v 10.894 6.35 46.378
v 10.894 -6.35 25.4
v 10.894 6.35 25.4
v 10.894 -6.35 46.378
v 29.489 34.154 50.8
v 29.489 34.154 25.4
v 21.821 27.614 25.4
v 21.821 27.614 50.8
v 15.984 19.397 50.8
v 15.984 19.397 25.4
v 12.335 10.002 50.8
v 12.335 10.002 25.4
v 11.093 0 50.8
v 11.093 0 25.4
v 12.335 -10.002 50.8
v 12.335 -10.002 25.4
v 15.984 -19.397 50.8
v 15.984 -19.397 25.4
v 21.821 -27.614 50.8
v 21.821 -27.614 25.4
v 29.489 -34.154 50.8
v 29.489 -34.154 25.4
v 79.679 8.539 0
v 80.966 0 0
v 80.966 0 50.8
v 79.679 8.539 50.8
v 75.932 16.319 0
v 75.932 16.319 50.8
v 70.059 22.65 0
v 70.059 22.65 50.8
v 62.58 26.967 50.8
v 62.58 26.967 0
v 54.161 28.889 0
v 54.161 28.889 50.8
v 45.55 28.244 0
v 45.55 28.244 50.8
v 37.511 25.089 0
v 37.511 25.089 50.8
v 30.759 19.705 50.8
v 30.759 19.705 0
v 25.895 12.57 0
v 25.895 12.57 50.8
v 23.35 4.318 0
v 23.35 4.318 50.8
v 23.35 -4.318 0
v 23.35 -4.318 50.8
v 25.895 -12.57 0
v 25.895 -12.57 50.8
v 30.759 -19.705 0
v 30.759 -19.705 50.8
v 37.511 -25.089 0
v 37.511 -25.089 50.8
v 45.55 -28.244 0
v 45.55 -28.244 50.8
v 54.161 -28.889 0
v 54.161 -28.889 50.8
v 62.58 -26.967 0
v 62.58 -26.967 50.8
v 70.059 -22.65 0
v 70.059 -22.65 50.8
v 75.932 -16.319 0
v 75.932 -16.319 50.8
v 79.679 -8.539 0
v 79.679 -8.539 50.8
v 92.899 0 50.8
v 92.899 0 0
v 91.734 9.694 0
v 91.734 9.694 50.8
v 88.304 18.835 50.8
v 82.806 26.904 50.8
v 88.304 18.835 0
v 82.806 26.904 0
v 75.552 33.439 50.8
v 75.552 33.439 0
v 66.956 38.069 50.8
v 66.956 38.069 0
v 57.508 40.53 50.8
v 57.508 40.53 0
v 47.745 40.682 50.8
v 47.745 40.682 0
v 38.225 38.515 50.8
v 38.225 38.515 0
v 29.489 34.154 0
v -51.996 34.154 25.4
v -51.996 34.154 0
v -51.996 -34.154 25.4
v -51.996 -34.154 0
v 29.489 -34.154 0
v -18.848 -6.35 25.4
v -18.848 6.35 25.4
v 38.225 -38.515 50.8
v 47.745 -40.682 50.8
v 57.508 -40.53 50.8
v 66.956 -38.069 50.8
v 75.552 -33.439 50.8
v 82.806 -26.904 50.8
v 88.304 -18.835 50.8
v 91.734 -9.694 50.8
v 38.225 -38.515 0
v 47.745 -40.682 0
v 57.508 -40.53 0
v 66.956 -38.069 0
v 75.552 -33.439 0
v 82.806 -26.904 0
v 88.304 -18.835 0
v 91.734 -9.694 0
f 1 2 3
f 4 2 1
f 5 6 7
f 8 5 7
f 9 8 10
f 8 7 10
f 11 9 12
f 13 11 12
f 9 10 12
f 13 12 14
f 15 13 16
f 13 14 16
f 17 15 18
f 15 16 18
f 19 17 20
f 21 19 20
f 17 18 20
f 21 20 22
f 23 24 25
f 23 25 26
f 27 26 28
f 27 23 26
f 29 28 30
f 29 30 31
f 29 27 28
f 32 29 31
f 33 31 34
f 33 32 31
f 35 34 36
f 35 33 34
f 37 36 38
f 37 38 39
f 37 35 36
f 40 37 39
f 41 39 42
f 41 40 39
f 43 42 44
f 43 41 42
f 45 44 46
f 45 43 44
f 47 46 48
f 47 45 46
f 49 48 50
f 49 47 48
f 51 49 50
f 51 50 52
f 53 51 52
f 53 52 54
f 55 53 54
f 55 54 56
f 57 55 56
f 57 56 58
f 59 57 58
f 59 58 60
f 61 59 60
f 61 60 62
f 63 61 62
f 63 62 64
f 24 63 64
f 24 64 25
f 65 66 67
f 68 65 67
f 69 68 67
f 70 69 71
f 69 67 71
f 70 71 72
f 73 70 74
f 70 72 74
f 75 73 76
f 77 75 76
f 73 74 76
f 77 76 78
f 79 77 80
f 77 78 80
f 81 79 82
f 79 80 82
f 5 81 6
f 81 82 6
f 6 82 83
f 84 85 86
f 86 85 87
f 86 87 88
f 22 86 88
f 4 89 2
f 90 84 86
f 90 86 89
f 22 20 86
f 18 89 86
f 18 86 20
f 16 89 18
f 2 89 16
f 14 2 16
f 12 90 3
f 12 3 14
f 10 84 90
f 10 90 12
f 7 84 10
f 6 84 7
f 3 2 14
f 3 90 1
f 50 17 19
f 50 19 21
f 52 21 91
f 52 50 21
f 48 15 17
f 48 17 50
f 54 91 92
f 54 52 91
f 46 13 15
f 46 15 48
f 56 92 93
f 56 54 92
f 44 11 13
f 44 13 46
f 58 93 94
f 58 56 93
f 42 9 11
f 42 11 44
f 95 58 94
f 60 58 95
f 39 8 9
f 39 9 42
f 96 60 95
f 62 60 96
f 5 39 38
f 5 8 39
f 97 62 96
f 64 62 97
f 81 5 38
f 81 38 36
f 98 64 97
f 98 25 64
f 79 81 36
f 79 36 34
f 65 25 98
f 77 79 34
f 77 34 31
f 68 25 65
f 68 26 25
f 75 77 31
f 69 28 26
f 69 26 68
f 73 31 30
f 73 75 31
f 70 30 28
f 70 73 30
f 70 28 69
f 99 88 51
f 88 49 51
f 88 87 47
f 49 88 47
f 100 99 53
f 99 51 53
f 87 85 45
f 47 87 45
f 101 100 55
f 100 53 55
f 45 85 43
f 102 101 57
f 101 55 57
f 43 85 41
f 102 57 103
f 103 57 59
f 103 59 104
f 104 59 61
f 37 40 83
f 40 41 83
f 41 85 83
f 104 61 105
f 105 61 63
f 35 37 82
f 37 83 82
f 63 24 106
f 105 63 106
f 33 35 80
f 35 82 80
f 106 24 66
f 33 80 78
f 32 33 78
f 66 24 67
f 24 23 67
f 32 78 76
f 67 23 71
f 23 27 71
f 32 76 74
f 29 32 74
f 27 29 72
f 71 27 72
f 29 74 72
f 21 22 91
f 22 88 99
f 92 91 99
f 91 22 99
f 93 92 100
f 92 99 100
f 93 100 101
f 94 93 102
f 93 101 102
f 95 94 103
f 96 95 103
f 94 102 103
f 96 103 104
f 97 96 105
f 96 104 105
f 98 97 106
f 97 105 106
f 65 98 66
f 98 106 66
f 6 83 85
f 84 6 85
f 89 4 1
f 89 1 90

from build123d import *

# Parameters (mm, degrees)
F0_R     = 28.970038
F1_DEPTH = 50.8
F2_DEPTH = 25.4
F4_DEPTH = 6.35


with BuildPart() as f1:
    # F0 (on Top) → F1 (new body)
    with BuildSketch(Plane.XY):
        with BuildLine():
            ThreePointArc((92.899099, 0), (71.392782, 36.011503), (29.489314, 34.154247))
            ThreePointArc((29.489314, 34.154247), (11.092901, 0), (29.489314, -34.154247))
            ThreePointArc((29.489314, -34.154247), (71.392782, -36.011503), (92.899099, 0))
        make_face()
        with Locations((51.996, 0)):
            Circle(F0_R, mode=Mode.SUBTRACT)
    extrude(amount=F1_DEPTH)

    # F0 (on Top) → F2 (join)
    with BuildSketch(Plane.XY):
        with BuildLine():
            ThreePointArc((29.489314, -34.154247), (11.092901, 0), (29.489314, 34.154247))
            Line((29.489314, 34.154247), (-51.996, 34.154247))
            Line((-51.996, 34.154247), (-51.996, -34.154247))
            Line((-51.996, -34.154247), (29.489314, -34.154247))
        make_face()
        with BuildLine():
            ThreePointArc((92.899099, 0), (71.392782, 36.011503), (29.489314, 34.154247))
            ThreePointArc((29.489314, 34.154247), (11.092901, 0), (29.489314, -34.154247))
            ThreePointArc((29.489314, -34.154247), (71.392782, -36.011503), (92.899099, 0))
        make_face()
        with Locations((51.996, 0)):
            Circle(F0_R, mode=Mode.SUBTRACT)
    extrude(amount=F2_DEPTH)

    # F3 (on Front) → F4 (join, symmetric)
    with BuildSketch(Plane.XZ):
        Polygon((-25.342142, 20.81975), (10.89422, 20.81975), (10.89422, 46.377778), align=None)
    extrude(amount=F4_DEPTH, both=True)


solid = f1.part
